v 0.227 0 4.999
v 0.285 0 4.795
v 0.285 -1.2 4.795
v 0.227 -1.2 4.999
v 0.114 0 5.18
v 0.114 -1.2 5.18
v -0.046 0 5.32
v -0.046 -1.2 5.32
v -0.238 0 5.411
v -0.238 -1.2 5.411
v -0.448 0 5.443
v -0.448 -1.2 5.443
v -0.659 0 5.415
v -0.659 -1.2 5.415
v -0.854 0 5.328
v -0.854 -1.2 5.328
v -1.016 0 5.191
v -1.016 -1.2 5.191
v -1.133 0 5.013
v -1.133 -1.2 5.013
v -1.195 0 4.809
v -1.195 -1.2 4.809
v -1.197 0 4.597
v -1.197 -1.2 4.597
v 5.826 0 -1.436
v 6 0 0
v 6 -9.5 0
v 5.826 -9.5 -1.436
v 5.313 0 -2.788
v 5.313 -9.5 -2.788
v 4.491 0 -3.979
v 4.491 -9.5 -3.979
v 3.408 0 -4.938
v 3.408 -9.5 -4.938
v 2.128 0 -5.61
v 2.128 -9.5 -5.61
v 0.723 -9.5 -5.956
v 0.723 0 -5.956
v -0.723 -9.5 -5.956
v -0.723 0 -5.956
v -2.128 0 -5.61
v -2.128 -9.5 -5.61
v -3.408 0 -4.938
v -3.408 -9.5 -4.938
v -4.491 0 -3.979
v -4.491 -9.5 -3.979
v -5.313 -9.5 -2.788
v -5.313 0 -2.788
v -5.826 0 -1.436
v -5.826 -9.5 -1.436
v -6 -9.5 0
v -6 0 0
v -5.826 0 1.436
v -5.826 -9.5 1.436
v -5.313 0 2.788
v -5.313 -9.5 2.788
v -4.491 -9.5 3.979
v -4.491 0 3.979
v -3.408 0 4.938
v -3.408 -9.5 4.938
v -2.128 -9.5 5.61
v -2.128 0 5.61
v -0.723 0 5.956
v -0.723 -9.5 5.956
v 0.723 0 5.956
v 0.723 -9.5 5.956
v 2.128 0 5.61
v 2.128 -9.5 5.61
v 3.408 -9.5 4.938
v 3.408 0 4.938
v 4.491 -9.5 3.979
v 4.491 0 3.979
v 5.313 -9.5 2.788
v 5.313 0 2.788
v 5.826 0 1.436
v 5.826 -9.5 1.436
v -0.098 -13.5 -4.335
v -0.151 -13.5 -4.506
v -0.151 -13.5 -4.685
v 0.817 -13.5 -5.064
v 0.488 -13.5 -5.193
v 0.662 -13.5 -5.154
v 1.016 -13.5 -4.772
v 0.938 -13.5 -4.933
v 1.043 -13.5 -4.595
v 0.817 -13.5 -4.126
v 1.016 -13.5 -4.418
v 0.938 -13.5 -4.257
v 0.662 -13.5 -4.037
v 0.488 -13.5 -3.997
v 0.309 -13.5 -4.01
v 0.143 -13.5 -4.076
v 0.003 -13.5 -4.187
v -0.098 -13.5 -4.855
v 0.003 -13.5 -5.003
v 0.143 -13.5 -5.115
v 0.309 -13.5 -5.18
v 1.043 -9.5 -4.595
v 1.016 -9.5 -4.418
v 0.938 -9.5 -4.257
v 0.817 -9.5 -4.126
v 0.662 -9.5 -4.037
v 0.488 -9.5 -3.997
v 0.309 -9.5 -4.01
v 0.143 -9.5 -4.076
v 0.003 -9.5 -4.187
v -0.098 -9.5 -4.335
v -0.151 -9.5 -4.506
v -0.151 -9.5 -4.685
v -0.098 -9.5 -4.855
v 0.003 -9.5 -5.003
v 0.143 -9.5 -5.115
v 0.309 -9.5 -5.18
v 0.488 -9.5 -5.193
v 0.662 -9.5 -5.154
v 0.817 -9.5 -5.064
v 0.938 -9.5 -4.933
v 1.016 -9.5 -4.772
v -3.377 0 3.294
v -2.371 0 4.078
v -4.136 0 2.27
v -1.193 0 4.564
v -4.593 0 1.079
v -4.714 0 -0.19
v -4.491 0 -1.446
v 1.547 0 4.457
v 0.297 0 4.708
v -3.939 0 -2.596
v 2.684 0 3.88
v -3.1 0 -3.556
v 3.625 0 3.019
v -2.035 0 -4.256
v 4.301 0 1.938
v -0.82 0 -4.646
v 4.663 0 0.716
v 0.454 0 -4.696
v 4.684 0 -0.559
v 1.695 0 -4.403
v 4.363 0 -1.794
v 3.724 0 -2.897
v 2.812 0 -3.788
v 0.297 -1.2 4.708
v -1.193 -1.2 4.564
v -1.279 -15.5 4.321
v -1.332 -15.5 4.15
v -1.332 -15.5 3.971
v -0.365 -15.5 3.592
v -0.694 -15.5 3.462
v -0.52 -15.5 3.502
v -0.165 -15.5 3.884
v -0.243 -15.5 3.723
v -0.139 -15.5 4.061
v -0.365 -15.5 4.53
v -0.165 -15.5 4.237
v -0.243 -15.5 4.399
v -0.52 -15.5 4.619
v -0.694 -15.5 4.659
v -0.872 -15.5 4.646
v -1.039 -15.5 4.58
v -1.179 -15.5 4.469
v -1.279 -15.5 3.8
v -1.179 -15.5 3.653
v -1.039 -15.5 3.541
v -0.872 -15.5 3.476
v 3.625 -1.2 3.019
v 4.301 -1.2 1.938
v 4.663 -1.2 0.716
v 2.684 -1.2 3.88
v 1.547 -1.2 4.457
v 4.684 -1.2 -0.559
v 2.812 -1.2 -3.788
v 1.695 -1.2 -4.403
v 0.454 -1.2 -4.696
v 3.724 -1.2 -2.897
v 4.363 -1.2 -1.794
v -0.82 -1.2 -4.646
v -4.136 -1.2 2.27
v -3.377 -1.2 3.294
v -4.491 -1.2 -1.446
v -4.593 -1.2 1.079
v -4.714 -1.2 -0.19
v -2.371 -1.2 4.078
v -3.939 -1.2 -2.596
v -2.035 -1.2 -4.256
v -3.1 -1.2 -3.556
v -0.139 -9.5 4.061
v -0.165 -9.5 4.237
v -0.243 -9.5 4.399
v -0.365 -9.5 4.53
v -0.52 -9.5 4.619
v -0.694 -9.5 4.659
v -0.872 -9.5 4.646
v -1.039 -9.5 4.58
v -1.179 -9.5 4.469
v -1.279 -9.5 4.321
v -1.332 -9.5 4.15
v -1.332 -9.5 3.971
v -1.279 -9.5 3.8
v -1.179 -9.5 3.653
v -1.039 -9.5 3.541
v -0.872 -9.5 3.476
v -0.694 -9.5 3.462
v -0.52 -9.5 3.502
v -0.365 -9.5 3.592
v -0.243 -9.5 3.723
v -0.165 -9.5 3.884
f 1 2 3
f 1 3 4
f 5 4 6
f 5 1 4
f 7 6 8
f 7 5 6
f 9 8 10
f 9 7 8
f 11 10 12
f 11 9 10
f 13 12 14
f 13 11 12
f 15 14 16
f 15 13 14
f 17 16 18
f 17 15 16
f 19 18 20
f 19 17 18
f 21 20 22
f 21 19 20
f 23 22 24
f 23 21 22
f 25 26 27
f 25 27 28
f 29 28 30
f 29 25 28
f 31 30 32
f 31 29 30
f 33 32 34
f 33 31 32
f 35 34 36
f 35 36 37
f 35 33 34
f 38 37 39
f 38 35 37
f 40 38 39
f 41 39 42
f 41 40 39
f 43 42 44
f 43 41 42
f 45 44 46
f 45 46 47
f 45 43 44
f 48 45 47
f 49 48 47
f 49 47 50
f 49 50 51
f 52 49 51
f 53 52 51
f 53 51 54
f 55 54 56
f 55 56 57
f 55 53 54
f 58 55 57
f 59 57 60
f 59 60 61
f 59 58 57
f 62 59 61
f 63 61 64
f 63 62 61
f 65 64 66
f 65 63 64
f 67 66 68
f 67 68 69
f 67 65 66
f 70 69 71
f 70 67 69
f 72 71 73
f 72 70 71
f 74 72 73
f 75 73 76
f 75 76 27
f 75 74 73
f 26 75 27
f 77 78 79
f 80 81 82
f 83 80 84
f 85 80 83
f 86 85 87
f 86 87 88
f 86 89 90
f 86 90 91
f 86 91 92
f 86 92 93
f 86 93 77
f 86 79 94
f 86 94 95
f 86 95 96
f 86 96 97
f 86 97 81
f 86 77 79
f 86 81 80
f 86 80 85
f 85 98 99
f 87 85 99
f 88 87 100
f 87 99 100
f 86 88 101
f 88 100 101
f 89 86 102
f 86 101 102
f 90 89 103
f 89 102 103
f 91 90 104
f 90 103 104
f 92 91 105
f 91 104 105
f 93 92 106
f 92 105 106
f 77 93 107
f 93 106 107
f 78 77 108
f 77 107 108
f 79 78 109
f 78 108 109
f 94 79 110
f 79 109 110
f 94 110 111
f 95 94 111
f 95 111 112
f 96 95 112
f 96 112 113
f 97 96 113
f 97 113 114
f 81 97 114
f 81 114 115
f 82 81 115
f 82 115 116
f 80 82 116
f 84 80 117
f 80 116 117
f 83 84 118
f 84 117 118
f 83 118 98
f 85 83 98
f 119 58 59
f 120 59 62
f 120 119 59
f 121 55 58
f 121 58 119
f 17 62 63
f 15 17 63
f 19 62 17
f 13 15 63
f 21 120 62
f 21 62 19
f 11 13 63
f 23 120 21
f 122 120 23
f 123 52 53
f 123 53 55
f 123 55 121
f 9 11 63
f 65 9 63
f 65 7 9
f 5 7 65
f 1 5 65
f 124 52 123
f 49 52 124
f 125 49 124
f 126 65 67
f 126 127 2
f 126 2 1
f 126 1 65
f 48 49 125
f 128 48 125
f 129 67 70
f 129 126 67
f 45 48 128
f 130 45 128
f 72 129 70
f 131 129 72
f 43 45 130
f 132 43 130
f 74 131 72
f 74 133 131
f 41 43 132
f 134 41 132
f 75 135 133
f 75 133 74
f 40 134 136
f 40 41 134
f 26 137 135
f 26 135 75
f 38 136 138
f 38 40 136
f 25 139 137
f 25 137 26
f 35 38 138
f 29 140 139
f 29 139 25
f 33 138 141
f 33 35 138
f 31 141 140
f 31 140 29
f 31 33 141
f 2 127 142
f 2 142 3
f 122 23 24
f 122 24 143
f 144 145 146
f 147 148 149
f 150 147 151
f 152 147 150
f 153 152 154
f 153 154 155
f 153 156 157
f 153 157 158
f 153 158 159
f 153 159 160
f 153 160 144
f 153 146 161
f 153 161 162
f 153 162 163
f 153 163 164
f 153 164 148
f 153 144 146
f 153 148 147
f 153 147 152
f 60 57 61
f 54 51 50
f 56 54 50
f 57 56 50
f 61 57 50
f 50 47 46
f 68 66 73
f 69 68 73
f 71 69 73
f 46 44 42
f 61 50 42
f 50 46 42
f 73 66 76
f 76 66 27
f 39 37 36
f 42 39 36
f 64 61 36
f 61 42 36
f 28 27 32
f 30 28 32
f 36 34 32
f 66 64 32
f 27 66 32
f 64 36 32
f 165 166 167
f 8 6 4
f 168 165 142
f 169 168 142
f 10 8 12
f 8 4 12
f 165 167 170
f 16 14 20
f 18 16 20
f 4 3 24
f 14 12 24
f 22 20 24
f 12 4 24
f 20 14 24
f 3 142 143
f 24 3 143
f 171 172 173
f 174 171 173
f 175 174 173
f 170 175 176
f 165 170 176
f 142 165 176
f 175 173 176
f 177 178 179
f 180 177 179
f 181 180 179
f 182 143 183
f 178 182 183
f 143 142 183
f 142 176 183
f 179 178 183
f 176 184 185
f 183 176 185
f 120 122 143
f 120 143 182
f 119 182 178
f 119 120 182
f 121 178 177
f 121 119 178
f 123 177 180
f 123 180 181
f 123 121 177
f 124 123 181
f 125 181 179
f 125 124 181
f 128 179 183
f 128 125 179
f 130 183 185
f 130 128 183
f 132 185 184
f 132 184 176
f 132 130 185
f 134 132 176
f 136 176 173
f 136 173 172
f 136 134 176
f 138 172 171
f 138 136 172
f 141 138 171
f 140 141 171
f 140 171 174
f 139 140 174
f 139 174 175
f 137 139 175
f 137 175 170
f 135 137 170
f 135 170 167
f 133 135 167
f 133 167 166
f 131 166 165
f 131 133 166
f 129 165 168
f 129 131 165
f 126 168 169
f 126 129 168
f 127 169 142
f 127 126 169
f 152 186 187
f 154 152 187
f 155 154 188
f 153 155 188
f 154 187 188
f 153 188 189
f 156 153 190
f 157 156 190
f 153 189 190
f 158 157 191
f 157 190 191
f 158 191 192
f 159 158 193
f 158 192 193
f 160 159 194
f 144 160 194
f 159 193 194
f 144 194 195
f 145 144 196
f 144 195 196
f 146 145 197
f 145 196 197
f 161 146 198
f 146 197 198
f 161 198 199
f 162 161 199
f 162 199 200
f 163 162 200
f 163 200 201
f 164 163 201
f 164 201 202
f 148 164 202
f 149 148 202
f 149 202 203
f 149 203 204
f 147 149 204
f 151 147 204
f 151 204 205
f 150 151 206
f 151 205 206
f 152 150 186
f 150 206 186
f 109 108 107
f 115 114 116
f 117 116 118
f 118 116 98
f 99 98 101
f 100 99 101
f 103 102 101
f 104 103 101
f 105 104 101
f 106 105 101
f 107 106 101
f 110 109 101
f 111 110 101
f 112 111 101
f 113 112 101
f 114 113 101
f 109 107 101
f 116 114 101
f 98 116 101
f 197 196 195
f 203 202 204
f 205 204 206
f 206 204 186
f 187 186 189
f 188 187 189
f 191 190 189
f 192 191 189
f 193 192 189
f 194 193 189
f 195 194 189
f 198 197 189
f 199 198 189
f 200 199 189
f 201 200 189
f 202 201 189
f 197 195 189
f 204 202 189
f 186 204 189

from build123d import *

# Parameters (mm, degrees)
SKETCH1_R           = 6
BOSS_EXTRUDE1_DEPTH = 9.5
CUT_EXTRUDE1_DEPTH  = 1.2
SKETCH3_R           = 0.6
BOSS_EXTRUDE3_DEPTH = 6
SKETCH4_R           = 0.6
BOSS_EXTRUDE4_DEPTH = 4


with BuildPart() as part:
    # Sketch1 → Boss-Extrude1 (new body)
    with BuildSketch(Plane(origin=(0, 0, 0), x_dir=(1, 0, 0), z_dir=(0, 1, 0))):
        Circle(SKETCH1_R)
    extrude(amount=-BOSS_EXTRUDE1_DEPTH)

    # Sketch2 → Cut-Extrude1 (cut)
    with BuildSketch(Plane(origin=(0, 0, 0), x_dir=(1, 0, 0), z_dir=(0, 1, 0))):
        with BuildLine():
            Line((0.296610857, -4.708373641), (0.285073514, -4.794679689))
            ThreePointArc((0.285073514, -4.794679689), (-0.554937351, -5.436588397), (-1.19684606, -4.596577532))
            Line((-1.19684606, -4.596577532), (-1.192556618, -4.56449001))
            ThreePointArc((-1.192556618, -4.56449001), (0.453712824, 4.695839117), (0.296610857, -4.708373641))
        make_face()
    extrude(amount=-CUT_EXTRUDE1_DEPTH, mode=Mode.SUBTRACT)


with BuildPart() as body_2:
    # Sketch3 → Boss-Extrude3 (new body)
    with BuildSketch(Plane.XZ.offset(9.5)):
        with Locations((-0.73871062, 4.060638166)):
            Circle(SKETCH3_R)
    extrude(amount=BOSS_EXTRUDE3_DEPTH)


with BuildPart() as body_3:
    # Sketch4 → Boss-Extrude4 (new body)
    with BuildSketch(Plane.XZ.offset(9.5)):
        with Locations((0.442722745, -4.595156766)):
            Circle(SKETCH4_R)
    extrude(amount=BOSS_EXTRUDE4_DEPTH)


solid = Compound([part.part, body_2.part, body_3.part])
